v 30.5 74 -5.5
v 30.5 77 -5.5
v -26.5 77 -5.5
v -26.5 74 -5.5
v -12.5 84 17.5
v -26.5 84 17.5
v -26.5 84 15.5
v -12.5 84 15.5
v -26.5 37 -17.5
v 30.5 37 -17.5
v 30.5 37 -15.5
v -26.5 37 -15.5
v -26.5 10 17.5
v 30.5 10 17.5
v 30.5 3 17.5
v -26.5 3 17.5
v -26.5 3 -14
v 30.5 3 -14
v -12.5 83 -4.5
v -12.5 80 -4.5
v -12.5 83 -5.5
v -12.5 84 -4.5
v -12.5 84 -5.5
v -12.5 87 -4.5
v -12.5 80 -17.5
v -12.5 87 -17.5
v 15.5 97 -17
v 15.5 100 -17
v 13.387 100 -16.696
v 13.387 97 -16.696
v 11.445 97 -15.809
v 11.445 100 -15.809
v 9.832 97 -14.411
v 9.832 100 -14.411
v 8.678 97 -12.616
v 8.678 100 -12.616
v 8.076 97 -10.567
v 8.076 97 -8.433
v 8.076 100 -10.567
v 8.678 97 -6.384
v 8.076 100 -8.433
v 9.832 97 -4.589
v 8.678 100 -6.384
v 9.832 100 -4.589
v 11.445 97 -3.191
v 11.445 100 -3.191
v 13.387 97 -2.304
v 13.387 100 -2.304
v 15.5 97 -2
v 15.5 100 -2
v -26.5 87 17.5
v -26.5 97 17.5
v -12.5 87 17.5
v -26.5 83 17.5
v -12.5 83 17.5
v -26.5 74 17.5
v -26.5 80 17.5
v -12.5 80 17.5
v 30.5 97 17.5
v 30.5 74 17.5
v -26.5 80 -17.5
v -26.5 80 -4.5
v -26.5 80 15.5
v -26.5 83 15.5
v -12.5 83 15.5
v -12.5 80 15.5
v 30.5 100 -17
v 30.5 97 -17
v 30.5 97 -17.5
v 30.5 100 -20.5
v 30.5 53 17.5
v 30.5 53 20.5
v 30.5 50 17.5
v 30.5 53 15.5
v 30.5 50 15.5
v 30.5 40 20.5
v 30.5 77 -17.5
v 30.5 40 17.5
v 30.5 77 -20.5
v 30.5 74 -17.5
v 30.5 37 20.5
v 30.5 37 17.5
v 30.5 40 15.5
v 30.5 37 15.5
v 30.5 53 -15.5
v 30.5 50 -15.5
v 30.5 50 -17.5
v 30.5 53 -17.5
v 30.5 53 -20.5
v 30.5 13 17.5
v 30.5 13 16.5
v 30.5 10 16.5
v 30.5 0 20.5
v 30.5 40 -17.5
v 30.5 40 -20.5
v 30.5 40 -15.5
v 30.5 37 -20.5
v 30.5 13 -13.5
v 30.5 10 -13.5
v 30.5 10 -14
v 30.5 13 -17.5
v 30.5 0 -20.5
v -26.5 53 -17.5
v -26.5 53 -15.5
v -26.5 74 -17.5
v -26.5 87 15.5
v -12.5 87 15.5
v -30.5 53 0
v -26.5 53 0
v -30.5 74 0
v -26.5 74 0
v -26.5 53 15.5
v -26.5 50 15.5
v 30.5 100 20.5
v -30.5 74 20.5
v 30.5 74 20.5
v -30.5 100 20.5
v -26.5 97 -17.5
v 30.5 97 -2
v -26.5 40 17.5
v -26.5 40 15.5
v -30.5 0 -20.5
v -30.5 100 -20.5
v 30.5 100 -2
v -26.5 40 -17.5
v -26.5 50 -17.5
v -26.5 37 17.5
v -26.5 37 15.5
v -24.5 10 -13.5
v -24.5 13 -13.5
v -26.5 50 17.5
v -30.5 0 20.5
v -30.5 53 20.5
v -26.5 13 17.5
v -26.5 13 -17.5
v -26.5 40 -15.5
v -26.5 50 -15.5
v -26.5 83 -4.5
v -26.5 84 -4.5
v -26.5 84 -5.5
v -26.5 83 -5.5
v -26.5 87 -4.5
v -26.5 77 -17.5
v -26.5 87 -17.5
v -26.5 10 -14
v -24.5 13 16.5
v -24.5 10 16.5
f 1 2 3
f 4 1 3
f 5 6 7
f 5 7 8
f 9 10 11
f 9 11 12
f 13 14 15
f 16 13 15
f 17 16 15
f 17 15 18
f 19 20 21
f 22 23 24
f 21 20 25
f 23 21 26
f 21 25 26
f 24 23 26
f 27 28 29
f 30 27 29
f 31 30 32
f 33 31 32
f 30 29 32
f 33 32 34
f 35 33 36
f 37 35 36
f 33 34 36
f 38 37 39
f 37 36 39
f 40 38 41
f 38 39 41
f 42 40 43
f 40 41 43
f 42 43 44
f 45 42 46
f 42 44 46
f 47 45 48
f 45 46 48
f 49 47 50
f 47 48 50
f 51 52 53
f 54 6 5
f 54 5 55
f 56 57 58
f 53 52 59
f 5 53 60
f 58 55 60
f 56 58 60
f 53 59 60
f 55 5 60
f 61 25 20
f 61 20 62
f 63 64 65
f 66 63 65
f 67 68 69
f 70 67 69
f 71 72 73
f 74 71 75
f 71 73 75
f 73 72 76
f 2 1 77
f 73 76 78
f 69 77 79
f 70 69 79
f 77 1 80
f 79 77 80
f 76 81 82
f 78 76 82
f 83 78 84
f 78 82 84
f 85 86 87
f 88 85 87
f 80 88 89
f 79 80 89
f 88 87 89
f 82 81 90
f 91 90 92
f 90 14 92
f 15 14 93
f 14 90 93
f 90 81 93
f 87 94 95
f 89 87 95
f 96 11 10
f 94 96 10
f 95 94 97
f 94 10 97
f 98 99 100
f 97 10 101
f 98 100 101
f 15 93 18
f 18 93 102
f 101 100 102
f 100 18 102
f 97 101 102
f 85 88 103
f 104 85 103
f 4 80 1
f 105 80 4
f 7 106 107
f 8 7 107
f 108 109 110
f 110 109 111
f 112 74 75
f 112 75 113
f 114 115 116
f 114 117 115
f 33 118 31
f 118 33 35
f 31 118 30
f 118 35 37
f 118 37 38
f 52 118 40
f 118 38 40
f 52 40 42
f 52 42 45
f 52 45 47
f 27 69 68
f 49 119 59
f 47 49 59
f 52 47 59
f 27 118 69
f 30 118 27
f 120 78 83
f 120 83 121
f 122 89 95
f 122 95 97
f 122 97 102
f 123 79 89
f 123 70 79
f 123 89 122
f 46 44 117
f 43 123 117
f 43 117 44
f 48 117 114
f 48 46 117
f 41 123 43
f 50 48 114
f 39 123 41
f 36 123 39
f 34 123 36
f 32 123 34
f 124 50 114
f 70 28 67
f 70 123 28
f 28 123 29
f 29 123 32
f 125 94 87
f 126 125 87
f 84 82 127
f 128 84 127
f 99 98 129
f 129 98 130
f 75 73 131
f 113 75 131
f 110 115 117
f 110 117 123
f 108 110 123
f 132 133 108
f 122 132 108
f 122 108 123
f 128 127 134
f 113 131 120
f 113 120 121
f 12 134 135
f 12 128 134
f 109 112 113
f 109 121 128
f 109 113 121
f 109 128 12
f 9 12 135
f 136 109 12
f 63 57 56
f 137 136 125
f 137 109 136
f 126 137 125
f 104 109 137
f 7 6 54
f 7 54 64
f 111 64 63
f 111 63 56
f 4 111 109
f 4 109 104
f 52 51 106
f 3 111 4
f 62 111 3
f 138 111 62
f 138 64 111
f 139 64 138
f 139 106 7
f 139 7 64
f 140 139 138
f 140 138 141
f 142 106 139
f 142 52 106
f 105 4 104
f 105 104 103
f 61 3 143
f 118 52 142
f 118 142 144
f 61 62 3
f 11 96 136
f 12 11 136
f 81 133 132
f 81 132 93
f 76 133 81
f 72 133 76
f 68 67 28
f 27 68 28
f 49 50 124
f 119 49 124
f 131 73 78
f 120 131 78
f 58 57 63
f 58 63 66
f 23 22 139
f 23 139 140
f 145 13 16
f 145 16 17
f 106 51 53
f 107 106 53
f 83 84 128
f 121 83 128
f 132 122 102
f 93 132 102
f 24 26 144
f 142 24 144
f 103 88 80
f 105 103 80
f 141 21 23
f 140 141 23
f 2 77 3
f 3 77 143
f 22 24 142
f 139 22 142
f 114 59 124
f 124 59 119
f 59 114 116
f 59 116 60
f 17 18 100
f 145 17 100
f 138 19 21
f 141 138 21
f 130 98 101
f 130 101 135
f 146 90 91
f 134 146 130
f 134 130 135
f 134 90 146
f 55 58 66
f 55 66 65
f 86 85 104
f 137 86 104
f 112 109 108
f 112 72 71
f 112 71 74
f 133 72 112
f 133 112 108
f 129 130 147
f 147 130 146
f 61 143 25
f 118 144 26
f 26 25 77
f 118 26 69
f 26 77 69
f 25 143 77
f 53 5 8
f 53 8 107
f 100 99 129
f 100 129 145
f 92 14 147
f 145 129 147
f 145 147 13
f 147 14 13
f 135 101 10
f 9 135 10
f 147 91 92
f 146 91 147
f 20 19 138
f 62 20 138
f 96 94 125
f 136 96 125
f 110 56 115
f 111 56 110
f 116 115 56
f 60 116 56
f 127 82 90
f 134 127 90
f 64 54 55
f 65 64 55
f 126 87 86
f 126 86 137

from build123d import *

# Parameters (mm, degrees)
ESQUISSE1_W                          = 61
ESQUISSE1_H                          = 41
BOSS_EXTRU_1_DEPTH                   = 100
ENL_V_MAT_EXTRU_1_DEPTH              = 57
ESQUISSE6_W                          = 58
ESQUISSE6_H                          = 3
BOSS_EXTRU_2_DEPTH                   = 4
ESQUISSE7_W                          = 35
ESQUISSE7_H                          = 3
BOSS_EXTRU_3_DEPTH                   = 6
ESQUISSE11_W                         = 58
ESQUISSE11_H                         = 3
BOSS_EXTRU_4_DEPTH                   = 7
ESQUISSE12_W                         = 59.546555331
ESQUISSE12_H                         = 3
BOSS_EXTRU_5_DEPTH                   = 5
R_P_TITION_LIN_AIRE1_COUNT           = 2
R_P_TITION_LIN_AIRE1_PITCH           = 13
R_P_TITION_LIN_AIRE1_COPY_1_SKETCH_W = 59.546555331
R_P_TITION_LIN_AIRE1_COPY_1_SKETCH_H = 3
R_P_TITION_LIN_AIRE1_COPY_1_DEPTH    = 5
ESQUISSE13_W                         = 15
ESQUISSE13_H                         = 3
BOSS_EXTRU_6_DEPTH                   = 5
R_P_TITION_LIN_AIRE3_COUNT           = 2
R_P_TITION_LIN_AIRE3_PITCH           = 4
ESQUISSE14_W                         = 15
ESQUISSE14_H                         = 7
BOSS_EXTRU_7_DEPTH                   = 16
ESQUISSE15_W                         = 2
ESQUISSE15_H                         = 1
ENL_V_MAT_EXTRU_2_DEPTH              = 14
ENL_V_MAT_EXTRU_3_DEPTH              = 15
ESQUISSE17_W                         = 59.954419869
ESQUISSE17_H                         = 3
BOSS_EXTRU_8_DEPTH                   = 15
ESQUISSE18_W                         = 20.5
ESQUISSE18_H                         = 21
ENL_V_MAT_EXTRU_4_DEPTH              = 62


with BuildPart() as part:
    # Esquisse1 → Boss.-Extru.1 (new body)
    with BuildSketch(Plane(origin=(0, 0, 0), x_dir=(1, 0, 0), z_dir=(0, 1, 0))):
        Rectangle(ESQUISSE1_W, ESQUISSE1_H)
    extrude(amount=BOSS_EXTRU_1_DEPTH)

    # Esquisse3 → Enlèv. mat.-Extru.1 (cut)
    with BuildSketch(Plane(origin=(30.5, 0, 0), x_dir=(0, 0, -1), z_dir=(1, 0, 0))):
        Polygon((17.5, 13), (17.5, 97), (-17.5, 97), (-17.5, 3), (14, 3), (14, 13), align=None)
    extrude(amount=-ENL_V_MAT_EXTRU_1_DEPTH, mode=Mode.SUBTRACT)

    # Esquisse6 → Boss.-Extru.2 (add)
    with BuildSketch(Plane(origin=(0, 0, -20.5), x_dir=(-1, 0, 0), z_dir=(0, 0, -1))):
        with Locations((-1.5, 11.5)):
            Rectangle(ESQUISSE6_W, ESQUISSE6_H)
    boss_extru_2 = extrude(amount=-BOSS_EXTRU_2_DEPTH)

    # Symétrie1: Boss.-Extru.2 across plane
    add(boss_extru_2.mirror(Plane.XY))

    # Esquisse7 → Boss.-Extru.3 (add)
    with BuildSketch(Plane.ZY.offset(30.5)):
        with Locations((0, 11.5)):
            Rectangle(ESQUISSE7_W, ESQUISSE7_H)
    extrude(amount=-BOSS_EXTRU_3_DEPTH)

    # Esquisse11 → Boss.-Extru.4 (add)
    with BuildSketch(Plane(origin=(0, 0, -20.5), x_dir=(-1, 0, 0), z_dir=(0, 0, -1))):
        with Locations((-1.5, 11.5)):
            Rectangle(ESQUISSE11_W, ESQUISSE11_H)
    extrude(amount=-BOSS_EXTRU_4_DEPTH)

    # Esquisse12 → Boss.-Extru.5 (add)
    with BuildSketch(Plane(origin=(0, 0, -20.5), x_dir=(-1, 0, 0), z_dir=(0, 0, -1))):
        with Locations((-0.726722335, 51.5)):
            Rectangle(ESQUISSE12_W, ESQUISSE12_H)
    boss_extru_5 = extrude(amount=-BOSS_EXTRU_5_DEPTH)

    # Symétrie2: Boss.-Extru.5 across plane
    add(boss_extru_5.mirror(Plane.XY))

    # Répétition linéaire1: Boss.-Extru.5 ×2
    with Locations(*[(0, -i * R_P_TITION_LIN_AIRE1_PITCH, 0) for i in range(1, R_P_TITION_LIN_AIRE1_COUNT)]):
        add(boss_extru_5)

    # Répétition linéaire1 copy 1 sketch → Répétition linéaire1 copy 1 (add)
    with BuildSketch(Plane(origin=(0, -13, 20.5), x_dir=(-1, 0, 0), z_dir=(0, 0, 1))):
        with Locations((-0.726722335, -51.5)):
            Rectangle(R_P_TITION_LIN_AIRE1_COPY_1_SKETCH_W, R_P_TITION_LIN_AIRE1_COPY_1_SKETCH_H)
    extrude(amount=-R_P_TITION_LIN_AIRE1_COPY_1_DEPTH)

    # Esquisse13 → Boss.-Extru.6 (add)
    with BuildSketch(Plane.XY.offset(20.5)):
        with Locations((-20, 81.5)):
            Rectangle(ESQUISSE13_W, ESQUISSE13_H)
    boss_extru_6 = extrude(amount=-BOSS_EXTRU_6_DEPTH)

    # Répétition linéaire3: Boss.-Extru.6 ×2
    with Locations(*[(0, i * R_P_TITION_LIN_AIRE3_PITCH, 0) for i in range(1, R_P_TITION_LIN_AIRE3_COUNT)]):
        add(boss_extru_6)

    # Esquisse14 → Boss.-Extru.7 (add)
    with BuildSketch(Plane(origin=(0, 0, -20.5), x_dir=(-1, 0, 0), z_dir=(0, 0, -1))):
        with Locations((20, 83.5)):
            Rectangle(ESQUISSE14_W, ESQUISSE14_H)
    extrude(amount=-BOSS_EXTRU_7_DEPTH)

    # Esquisse15 → Enlèv. mat.-Extru.2 (cut)
    with BuildSketch(Plane(origin=(-12.5, 0, 0), x_dir=(0, 0, -1), z_dir=(1, 0, 0))):
        with Locations((4.5, 83.5)):
            Rectangle(ESQUISSE15_W, ESQUISSE15_H)
    extrude(amount=-ENL_V_MAT_EXTRU_2_DEPTH, mode=Mode.SUBTRACT)

    # Esquisse16 → Enlèv. mat.-Extru.3 (cut)
    with BuildSketch(Plane(origin=(0, 100, 0), x_dir=(1, 0, 0), z_dir=(0, 1, 0))):
        with BuildLine():
            Line((15.5, 2), (30.5, 2))
            Line((30.5, 2), (30.5, 17))
            Line((30.5, 17), (15.5, 17))
            ThreePointArc((15.5, 17), (8, 9.5), (15.5, 2))
        make_face()
    extrude(amount=-ENL_V_MAT_EXTRU_3_DEPTH, mode=Mode.SUBTRACT)

    # Esquisse17 → Boss.-Extru.8 (add)
    with BuildSketch(Plane(origin=(0, 0, -20.5), x_dir=(-1, 0, 0), z_dir=(0, 0, -1))):
        with Locations((-0.522790066, 75.5)):
            Rectangle(ESQUISSE17_W, ESQUISSE17_H)
    extrude(amount=-BOSS_EXTRU_8_DEPTH)

    # Esquisse18 → Enlèv. mat.-Extru.4 (cut, through all)
    with BuildSketch(Plane(origin=(30.5, 0, 0), x_dir=(0, 0, -1), z_dir=(1, 0, 0))):
        with Locations((-10.25, 63.5)):
            Rectangle(ESQUISSE18_W, ESQUISSE18_H)
    extrude(amount=-ENL_V_MAT_EXTRU_4_DEPTH, mode=Mode.SUBTRACT)


solid = part.part
